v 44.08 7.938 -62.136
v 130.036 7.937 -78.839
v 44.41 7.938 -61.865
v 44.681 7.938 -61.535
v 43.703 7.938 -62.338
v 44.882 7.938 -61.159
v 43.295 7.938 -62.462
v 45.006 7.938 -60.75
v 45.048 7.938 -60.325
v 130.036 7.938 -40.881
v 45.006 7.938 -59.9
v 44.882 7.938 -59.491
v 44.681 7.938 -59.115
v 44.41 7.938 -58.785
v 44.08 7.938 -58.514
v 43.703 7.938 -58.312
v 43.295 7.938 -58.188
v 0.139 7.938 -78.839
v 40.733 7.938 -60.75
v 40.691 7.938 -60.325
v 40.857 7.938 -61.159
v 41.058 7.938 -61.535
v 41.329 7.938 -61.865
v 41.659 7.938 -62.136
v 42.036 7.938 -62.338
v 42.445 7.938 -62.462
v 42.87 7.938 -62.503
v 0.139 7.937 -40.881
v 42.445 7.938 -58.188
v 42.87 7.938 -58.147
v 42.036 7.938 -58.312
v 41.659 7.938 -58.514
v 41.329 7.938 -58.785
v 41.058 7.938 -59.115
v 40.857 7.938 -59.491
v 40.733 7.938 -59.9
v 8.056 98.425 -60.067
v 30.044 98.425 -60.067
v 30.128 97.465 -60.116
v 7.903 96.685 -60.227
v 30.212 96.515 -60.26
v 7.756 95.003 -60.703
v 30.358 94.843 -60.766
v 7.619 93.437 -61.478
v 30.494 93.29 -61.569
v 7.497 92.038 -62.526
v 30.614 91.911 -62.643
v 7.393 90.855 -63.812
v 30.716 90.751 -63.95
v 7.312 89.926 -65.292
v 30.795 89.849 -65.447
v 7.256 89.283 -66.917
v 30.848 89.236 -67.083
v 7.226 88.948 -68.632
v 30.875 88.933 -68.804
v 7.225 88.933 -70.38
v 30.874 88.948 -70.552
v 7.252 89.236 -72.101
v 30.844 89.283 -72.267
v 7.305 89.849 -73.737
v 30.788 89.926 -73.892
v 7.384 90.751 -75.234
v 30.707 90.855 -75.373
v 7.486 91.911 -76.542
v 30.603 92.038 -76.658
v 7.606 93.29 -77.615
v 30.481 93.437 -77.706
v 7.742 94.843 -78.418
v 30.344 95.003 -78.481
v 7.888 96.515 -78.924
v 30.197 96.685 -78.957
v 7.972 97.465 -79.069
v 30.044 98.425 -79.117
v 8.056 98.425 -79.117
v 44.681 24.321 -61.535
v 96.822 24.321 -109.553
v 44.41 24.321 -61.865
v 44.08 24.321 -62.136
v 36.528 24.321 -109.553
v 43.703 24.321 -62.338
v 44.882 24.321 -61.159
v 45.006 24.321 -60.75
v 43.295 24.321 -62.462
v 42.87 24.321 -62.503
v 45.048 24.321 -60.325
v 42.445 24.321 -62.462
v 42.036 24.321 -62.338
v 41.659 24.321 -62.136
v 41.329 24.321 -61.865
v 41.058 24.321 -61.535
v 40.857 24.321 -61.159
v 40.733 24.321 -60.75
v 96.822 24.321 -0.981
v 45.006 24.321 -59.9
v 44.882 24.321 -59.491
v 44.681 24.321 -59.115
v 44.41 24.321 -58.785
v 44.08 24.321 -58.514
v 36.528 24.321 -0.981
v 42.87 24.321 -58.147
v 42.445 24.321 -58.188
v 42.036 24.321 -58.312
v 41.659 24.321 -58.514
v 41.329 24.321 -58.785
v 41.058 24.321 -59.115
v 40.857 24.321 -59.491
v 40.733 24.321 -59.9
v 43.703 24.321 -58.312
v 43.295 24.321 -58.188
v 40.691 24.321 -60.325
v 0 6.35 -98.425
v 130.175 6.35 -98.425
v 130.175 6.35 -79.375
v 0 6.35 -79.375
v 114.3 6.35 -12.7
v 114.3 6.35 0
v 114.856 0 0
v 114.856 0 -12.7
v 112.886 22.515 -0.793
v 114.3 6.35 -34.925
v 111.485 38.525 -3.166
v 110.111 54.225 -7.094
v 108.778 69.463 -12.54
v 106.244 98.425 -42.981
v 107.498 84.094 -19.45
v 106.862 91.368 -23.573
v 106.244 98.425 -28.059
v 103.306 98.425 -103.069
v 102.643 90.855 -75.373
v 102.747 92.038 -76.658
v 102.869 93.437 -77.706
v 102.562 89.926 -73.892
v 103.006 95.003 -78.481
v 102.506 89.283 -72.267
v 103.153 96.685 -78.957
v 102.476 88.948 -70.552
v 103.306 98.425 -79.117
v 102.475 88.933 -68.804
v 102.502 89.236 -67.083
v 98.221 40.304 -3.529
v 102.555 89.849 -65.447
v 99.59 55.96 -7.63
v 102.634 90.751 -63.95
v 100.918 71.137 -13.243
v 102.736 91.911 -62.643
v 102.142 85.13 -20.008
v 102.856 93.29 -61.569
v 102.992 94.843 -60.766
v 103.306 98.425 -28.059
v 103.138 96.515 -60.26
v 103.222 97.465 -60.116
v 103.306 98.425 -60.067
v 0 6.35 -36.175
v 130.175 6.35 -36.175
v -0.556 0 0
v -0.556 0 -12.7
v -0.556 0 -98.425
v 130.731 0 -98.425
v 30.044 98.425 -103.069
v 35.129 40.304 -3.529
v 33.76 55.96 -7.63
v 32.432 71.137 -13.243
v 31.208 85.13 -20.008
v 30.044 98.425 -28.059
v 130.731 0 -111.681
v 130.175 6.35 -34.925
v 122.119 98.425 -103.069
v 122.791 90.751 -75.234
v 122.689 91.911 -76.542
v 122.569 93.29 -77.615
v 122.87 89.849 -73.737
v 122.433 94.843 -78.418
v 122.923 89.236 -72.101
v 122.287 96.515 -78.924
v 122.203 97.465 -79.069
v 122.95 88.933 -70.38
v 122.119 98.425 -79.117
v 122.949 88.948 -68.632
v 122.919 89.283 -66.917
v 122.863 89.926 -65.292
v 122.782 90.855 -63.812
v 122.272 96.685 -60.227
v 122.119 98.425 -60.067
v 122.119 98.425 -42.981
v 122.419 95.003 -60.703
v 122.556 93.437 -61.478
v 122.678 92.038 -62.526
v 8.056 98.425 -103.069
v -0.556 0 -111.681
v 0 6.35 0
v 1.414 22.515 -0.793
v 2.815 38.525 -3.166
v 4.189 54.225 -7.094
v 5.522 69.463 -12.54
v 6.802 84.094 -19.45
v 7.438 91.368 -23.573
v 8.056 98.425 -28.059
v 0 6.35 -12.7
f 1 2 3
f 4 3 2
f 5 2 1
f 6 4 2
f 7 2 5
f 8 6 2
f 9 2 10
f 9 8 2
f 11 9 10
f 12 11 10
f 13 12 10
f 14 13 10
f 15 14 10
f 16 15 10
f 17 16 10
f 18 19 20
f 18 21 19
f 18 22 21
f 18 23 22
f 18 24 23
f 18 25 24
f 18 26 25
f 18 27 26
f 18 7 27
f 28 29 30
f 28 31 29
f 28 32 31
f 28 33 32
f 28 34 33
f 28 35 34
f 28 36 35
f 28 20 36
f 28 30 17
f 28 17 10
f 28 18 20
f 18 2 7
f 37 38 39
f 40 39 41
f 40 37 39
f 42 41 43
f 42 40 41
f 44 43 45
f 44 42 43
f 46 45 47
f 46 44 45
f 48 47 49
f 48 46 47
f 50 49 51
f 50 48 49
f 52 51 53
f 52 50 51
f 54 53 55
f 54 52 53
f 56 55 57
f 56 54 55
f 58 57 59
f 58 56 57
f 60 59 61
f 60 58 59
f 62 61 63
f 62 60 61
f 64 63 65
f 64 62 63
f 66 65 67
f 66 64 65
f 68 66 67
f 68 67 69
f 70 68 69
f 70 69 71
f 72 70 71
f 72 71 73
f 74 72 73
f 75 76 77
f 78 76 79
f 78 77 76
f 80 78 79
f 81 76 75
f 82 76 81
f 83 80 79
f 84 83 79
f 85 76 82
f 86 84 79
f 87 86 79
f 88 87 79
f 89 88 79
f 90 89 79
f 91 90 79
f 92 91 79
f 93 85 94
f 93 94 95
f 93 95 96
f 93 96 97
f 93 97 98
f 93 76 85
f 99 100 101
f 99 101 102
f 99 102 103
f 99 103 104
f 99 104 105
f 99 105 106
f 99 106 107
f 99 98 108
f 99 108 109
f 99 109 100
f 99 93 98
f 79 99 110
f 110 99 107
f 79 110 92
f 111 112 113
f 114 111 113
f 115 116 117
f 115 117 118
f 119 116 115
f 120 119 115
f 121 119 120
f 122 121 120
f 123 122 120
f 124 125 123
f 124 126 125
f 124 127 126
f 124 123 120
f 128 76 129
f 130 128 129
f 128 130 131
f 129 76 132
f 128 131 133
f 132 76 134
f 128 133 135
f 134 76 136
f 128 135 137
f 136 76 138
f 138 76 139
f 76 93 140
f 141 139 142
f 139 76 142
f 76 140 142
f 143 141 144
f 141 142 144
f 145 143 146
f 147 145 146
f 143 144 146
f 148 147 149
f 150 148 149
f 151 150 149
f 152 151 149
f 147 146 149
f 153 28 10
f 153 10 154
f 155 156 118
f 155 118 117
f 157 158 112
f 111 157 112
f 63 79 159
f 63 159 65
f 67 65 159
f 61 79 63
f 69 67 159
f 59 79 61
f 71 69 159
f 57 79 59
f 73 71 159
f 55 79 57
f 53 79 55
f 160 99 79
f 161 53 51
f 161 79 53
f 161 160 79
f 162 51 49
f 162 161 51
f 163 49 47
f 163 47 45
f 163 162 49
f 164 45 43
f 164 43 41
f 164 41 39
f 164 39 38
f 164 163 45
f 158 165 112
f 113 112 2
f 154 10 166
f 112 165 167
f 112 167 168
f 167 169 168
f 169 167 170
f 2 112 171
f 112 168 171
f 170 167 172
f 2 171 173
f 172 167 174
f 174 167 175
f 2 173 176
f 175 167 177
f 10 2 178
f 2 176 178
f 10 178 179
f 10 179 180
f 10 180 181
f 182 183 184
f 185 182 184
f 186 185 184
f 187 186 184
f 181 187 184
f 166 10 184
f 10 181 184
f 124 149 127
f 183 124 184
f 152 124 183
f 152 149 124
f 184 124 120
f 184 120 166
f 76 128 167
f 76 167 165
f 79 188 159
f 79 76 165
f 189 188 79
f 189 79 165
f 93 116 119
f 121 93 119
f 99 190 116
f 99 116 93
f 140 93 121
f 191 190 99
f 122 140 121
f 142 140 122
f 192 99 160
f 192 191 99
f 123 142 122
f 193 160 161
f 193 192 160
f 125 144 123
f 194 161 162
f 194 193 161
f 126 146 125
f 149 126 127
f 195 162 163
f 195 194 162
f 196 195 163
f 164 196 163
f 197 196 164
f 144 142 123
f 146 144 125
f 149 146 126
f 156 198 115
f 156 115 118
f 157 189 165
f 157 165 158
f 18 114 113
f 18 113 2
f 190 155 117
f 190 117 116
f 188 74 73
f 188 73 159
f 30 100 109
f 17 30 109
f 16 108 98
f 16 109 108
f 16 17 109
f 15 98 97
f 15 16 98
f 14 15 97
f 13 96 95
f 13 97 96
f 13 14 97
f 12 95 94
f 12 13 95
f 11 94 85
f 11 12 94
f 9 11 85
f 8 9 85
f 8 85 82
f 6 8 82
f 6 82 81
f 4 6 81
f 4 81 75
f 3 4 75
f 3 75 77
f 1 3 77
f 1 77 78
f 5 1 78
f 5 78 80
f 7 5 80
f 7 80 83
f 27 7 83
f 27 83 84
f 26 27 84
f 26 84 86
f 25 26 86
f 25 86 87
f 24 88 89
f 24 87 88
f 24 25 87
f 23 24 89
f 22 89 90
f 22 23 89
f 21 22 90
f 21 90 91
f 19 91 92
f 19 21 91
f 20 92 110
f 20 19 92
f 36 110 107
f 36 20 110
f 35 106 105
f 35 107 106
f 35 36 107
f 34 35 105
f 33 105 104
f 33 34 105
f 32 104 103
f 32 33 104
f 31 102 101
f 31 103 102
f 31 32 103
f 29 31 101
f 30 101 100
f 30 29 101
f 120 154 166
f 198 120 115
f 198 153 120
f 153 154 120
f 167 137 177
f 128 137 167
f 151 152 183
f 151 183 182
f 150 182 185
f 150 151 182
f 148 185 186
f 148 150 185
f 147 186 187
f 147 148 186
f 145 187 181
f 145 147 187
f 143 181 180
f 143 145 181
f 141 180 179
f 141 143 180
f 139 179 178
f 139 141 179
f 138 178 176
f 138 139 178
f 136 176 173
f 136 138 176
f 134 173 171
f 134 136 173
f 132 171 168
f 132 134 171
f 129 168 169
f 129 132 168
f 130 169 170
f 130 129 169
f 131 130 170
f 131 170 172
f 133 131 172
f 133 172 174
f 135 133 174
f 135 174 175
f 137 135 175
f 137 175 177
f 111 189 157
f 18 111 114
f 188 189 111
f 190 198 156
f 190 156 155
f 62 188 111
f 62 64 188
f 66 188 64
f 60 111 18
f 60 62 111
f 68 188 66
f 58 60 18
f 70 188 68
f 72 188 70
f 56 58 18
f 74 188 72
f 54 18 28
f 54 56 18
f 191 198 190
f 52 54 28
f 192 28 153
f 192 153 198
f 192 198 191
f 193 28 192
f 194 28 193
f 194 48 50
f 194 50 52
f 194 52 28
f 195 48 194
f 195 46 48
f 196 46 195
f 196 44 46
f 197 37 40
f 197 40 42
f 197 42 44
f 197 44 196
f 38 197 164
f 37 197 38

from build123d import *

# Parameters (mm, degrees)
BOSS_EXTRUDE1_DEPTH     = 130.175
CUT_EXTRUDE1_DEPTH      = 198.438033
CUT_EXTRUDE1_DEPTH_BACK = 198.438033
SKETCH2_W               = 57.15
SKETCH2_H               = 74.103907915
SKETCH3_W               = 15.875
SKETCH3_H               = 34.925
CUT_EXTRUDE2_DEPTH      = 198.438033
DRAFT1_ANGLE            = -5
CUT_EXTRUDE3_DEPTH      = 188.228236601
CUT_EXTRUDE3_DEPTH_BACK = 188.228236601
SKETCH4_R               = 2.178428953


with BuildPart() as part:
    # Sketch1 → Boss-Extrude1 (new body)
    with BuildSketch(Plane(origin=(0, 0, 0), x_dir=(0, 0, -1), z_dir=(1, 0, 0))):
        with BuildLine():
            Line((0, 0), (0, 6.35))
            ThreePointArc((0, 6.35), (7.170490025, 54.477745417), (28.059114221, 98.425))
            Line((28.059114221, 98.425), (60.067057111, 98.425))
            ThreePointArc((60.067057111, 98.425), (69.592057111, 88.9), (79.117057111, 98.425))
            Line((79.117057111, 98.425), (111.125, 98.425))
            Line((111.125, 98.425), (111.125, 0))
            Line((111.125, 0), (98.425, 0))
            Line((98.425, 0), (98.425, 6.35))
            Line((98.425, 6.35), (79.375, 6.35))
            Line((79.375, 6.35), (78.839467499, 7.9375))
            Line((78.839467499, 7.9375), (40.880795395, 7.9375))
            Line((40.880795395, 7.9375), (36.174906872, 6.35))
            Line((36.174906872, 6.35), (12.7, 6.35))
            Line((12.7, 6.35), (12.7, 0))
            Line((12.7, 0), (0, 0))
        make_face()
    extrude(amount=BOSS_EXTRUDE1_DEPTH)

    # Sketch2 → Cut-Extrude1 (cut, two sides: drawn at the far end of the back side and taken through both)
    with BuildSketch(Plane(origin=(0, 0, -111.125), x_dir=(-1, 0, 0), z_dir=(0, 0, -1)).offset(-CUT_EXTRUDE1_DEPTH_BACK)):
        with Locations((-66.675, 61.373046043)):
            Rectangle(SKETCH2_W, SKETCH2_H)
    extrude(amount=CUT_EXTRUDE1_DEPTH + CUT_EXTRUDE1_DEPTH_BACK, mode=Mode.SUBTRACT)

    # Sketch3 → Cut-Extrude2 (cut, through all)
    with BuildSketch(Plane(origin=(0, 98.425, 0), x_dir=(1, 0, 0), z_dir=(0, 1, 0))):
        with Locations((122.2375, 17.4625)):
            Rectangle(SKETCH3_W, SKETCH3_H)
    extrude(amount=-CUT_EXTRUDE2_DEPTH, mode=Mode.SUBTRACT)

    # Draft1
    draft1_faces = [part.faces().sort_by_distance(p)[0] for p in [
        (1.631962354, 49.2125, -111.125),
        (122.2375, 52.3875, -34.925),
        (130.175, 51.366021229, -73.60068913),
        (114.3, 42.899391588, -20.187689821),
        (95.25, 59.043863813, -60.63952827),
        (0, 49.133887707, -59.518940982),
        (38.1, 59.043863813, -60.63952827),
    ]]
    draft(draft1_faces, Plane(origin=(130.175, 6.35, -36.174906872), x_dir=(0, 0, -1), z_dir=(0, -1, 0)), DRAFT1_ANGLE)

    # Sketch4 → Cut-Extrude3 (cut, two sides: drawn at the far end of the back side and taken through both)
    with BuildSketch(Plane(origin=(0, 24.321092085, 0), x_dir=(1, 0, 0), z_dir=(0, 1, 0)).offset(-CUT_EXTRUDE3_DEPTH_BACK)):
        with Locations(Location((42.869708487, 60.325, 0), (0, 0, 270))):
            Circle(SKETCH4_R)
    extrude(amount=CUT_EXTRUDE3_DEPTH + CUT_EXTRUDE3_DEPTH_BACK, mode=Mode.SUBTRACT)


solid = part.part
